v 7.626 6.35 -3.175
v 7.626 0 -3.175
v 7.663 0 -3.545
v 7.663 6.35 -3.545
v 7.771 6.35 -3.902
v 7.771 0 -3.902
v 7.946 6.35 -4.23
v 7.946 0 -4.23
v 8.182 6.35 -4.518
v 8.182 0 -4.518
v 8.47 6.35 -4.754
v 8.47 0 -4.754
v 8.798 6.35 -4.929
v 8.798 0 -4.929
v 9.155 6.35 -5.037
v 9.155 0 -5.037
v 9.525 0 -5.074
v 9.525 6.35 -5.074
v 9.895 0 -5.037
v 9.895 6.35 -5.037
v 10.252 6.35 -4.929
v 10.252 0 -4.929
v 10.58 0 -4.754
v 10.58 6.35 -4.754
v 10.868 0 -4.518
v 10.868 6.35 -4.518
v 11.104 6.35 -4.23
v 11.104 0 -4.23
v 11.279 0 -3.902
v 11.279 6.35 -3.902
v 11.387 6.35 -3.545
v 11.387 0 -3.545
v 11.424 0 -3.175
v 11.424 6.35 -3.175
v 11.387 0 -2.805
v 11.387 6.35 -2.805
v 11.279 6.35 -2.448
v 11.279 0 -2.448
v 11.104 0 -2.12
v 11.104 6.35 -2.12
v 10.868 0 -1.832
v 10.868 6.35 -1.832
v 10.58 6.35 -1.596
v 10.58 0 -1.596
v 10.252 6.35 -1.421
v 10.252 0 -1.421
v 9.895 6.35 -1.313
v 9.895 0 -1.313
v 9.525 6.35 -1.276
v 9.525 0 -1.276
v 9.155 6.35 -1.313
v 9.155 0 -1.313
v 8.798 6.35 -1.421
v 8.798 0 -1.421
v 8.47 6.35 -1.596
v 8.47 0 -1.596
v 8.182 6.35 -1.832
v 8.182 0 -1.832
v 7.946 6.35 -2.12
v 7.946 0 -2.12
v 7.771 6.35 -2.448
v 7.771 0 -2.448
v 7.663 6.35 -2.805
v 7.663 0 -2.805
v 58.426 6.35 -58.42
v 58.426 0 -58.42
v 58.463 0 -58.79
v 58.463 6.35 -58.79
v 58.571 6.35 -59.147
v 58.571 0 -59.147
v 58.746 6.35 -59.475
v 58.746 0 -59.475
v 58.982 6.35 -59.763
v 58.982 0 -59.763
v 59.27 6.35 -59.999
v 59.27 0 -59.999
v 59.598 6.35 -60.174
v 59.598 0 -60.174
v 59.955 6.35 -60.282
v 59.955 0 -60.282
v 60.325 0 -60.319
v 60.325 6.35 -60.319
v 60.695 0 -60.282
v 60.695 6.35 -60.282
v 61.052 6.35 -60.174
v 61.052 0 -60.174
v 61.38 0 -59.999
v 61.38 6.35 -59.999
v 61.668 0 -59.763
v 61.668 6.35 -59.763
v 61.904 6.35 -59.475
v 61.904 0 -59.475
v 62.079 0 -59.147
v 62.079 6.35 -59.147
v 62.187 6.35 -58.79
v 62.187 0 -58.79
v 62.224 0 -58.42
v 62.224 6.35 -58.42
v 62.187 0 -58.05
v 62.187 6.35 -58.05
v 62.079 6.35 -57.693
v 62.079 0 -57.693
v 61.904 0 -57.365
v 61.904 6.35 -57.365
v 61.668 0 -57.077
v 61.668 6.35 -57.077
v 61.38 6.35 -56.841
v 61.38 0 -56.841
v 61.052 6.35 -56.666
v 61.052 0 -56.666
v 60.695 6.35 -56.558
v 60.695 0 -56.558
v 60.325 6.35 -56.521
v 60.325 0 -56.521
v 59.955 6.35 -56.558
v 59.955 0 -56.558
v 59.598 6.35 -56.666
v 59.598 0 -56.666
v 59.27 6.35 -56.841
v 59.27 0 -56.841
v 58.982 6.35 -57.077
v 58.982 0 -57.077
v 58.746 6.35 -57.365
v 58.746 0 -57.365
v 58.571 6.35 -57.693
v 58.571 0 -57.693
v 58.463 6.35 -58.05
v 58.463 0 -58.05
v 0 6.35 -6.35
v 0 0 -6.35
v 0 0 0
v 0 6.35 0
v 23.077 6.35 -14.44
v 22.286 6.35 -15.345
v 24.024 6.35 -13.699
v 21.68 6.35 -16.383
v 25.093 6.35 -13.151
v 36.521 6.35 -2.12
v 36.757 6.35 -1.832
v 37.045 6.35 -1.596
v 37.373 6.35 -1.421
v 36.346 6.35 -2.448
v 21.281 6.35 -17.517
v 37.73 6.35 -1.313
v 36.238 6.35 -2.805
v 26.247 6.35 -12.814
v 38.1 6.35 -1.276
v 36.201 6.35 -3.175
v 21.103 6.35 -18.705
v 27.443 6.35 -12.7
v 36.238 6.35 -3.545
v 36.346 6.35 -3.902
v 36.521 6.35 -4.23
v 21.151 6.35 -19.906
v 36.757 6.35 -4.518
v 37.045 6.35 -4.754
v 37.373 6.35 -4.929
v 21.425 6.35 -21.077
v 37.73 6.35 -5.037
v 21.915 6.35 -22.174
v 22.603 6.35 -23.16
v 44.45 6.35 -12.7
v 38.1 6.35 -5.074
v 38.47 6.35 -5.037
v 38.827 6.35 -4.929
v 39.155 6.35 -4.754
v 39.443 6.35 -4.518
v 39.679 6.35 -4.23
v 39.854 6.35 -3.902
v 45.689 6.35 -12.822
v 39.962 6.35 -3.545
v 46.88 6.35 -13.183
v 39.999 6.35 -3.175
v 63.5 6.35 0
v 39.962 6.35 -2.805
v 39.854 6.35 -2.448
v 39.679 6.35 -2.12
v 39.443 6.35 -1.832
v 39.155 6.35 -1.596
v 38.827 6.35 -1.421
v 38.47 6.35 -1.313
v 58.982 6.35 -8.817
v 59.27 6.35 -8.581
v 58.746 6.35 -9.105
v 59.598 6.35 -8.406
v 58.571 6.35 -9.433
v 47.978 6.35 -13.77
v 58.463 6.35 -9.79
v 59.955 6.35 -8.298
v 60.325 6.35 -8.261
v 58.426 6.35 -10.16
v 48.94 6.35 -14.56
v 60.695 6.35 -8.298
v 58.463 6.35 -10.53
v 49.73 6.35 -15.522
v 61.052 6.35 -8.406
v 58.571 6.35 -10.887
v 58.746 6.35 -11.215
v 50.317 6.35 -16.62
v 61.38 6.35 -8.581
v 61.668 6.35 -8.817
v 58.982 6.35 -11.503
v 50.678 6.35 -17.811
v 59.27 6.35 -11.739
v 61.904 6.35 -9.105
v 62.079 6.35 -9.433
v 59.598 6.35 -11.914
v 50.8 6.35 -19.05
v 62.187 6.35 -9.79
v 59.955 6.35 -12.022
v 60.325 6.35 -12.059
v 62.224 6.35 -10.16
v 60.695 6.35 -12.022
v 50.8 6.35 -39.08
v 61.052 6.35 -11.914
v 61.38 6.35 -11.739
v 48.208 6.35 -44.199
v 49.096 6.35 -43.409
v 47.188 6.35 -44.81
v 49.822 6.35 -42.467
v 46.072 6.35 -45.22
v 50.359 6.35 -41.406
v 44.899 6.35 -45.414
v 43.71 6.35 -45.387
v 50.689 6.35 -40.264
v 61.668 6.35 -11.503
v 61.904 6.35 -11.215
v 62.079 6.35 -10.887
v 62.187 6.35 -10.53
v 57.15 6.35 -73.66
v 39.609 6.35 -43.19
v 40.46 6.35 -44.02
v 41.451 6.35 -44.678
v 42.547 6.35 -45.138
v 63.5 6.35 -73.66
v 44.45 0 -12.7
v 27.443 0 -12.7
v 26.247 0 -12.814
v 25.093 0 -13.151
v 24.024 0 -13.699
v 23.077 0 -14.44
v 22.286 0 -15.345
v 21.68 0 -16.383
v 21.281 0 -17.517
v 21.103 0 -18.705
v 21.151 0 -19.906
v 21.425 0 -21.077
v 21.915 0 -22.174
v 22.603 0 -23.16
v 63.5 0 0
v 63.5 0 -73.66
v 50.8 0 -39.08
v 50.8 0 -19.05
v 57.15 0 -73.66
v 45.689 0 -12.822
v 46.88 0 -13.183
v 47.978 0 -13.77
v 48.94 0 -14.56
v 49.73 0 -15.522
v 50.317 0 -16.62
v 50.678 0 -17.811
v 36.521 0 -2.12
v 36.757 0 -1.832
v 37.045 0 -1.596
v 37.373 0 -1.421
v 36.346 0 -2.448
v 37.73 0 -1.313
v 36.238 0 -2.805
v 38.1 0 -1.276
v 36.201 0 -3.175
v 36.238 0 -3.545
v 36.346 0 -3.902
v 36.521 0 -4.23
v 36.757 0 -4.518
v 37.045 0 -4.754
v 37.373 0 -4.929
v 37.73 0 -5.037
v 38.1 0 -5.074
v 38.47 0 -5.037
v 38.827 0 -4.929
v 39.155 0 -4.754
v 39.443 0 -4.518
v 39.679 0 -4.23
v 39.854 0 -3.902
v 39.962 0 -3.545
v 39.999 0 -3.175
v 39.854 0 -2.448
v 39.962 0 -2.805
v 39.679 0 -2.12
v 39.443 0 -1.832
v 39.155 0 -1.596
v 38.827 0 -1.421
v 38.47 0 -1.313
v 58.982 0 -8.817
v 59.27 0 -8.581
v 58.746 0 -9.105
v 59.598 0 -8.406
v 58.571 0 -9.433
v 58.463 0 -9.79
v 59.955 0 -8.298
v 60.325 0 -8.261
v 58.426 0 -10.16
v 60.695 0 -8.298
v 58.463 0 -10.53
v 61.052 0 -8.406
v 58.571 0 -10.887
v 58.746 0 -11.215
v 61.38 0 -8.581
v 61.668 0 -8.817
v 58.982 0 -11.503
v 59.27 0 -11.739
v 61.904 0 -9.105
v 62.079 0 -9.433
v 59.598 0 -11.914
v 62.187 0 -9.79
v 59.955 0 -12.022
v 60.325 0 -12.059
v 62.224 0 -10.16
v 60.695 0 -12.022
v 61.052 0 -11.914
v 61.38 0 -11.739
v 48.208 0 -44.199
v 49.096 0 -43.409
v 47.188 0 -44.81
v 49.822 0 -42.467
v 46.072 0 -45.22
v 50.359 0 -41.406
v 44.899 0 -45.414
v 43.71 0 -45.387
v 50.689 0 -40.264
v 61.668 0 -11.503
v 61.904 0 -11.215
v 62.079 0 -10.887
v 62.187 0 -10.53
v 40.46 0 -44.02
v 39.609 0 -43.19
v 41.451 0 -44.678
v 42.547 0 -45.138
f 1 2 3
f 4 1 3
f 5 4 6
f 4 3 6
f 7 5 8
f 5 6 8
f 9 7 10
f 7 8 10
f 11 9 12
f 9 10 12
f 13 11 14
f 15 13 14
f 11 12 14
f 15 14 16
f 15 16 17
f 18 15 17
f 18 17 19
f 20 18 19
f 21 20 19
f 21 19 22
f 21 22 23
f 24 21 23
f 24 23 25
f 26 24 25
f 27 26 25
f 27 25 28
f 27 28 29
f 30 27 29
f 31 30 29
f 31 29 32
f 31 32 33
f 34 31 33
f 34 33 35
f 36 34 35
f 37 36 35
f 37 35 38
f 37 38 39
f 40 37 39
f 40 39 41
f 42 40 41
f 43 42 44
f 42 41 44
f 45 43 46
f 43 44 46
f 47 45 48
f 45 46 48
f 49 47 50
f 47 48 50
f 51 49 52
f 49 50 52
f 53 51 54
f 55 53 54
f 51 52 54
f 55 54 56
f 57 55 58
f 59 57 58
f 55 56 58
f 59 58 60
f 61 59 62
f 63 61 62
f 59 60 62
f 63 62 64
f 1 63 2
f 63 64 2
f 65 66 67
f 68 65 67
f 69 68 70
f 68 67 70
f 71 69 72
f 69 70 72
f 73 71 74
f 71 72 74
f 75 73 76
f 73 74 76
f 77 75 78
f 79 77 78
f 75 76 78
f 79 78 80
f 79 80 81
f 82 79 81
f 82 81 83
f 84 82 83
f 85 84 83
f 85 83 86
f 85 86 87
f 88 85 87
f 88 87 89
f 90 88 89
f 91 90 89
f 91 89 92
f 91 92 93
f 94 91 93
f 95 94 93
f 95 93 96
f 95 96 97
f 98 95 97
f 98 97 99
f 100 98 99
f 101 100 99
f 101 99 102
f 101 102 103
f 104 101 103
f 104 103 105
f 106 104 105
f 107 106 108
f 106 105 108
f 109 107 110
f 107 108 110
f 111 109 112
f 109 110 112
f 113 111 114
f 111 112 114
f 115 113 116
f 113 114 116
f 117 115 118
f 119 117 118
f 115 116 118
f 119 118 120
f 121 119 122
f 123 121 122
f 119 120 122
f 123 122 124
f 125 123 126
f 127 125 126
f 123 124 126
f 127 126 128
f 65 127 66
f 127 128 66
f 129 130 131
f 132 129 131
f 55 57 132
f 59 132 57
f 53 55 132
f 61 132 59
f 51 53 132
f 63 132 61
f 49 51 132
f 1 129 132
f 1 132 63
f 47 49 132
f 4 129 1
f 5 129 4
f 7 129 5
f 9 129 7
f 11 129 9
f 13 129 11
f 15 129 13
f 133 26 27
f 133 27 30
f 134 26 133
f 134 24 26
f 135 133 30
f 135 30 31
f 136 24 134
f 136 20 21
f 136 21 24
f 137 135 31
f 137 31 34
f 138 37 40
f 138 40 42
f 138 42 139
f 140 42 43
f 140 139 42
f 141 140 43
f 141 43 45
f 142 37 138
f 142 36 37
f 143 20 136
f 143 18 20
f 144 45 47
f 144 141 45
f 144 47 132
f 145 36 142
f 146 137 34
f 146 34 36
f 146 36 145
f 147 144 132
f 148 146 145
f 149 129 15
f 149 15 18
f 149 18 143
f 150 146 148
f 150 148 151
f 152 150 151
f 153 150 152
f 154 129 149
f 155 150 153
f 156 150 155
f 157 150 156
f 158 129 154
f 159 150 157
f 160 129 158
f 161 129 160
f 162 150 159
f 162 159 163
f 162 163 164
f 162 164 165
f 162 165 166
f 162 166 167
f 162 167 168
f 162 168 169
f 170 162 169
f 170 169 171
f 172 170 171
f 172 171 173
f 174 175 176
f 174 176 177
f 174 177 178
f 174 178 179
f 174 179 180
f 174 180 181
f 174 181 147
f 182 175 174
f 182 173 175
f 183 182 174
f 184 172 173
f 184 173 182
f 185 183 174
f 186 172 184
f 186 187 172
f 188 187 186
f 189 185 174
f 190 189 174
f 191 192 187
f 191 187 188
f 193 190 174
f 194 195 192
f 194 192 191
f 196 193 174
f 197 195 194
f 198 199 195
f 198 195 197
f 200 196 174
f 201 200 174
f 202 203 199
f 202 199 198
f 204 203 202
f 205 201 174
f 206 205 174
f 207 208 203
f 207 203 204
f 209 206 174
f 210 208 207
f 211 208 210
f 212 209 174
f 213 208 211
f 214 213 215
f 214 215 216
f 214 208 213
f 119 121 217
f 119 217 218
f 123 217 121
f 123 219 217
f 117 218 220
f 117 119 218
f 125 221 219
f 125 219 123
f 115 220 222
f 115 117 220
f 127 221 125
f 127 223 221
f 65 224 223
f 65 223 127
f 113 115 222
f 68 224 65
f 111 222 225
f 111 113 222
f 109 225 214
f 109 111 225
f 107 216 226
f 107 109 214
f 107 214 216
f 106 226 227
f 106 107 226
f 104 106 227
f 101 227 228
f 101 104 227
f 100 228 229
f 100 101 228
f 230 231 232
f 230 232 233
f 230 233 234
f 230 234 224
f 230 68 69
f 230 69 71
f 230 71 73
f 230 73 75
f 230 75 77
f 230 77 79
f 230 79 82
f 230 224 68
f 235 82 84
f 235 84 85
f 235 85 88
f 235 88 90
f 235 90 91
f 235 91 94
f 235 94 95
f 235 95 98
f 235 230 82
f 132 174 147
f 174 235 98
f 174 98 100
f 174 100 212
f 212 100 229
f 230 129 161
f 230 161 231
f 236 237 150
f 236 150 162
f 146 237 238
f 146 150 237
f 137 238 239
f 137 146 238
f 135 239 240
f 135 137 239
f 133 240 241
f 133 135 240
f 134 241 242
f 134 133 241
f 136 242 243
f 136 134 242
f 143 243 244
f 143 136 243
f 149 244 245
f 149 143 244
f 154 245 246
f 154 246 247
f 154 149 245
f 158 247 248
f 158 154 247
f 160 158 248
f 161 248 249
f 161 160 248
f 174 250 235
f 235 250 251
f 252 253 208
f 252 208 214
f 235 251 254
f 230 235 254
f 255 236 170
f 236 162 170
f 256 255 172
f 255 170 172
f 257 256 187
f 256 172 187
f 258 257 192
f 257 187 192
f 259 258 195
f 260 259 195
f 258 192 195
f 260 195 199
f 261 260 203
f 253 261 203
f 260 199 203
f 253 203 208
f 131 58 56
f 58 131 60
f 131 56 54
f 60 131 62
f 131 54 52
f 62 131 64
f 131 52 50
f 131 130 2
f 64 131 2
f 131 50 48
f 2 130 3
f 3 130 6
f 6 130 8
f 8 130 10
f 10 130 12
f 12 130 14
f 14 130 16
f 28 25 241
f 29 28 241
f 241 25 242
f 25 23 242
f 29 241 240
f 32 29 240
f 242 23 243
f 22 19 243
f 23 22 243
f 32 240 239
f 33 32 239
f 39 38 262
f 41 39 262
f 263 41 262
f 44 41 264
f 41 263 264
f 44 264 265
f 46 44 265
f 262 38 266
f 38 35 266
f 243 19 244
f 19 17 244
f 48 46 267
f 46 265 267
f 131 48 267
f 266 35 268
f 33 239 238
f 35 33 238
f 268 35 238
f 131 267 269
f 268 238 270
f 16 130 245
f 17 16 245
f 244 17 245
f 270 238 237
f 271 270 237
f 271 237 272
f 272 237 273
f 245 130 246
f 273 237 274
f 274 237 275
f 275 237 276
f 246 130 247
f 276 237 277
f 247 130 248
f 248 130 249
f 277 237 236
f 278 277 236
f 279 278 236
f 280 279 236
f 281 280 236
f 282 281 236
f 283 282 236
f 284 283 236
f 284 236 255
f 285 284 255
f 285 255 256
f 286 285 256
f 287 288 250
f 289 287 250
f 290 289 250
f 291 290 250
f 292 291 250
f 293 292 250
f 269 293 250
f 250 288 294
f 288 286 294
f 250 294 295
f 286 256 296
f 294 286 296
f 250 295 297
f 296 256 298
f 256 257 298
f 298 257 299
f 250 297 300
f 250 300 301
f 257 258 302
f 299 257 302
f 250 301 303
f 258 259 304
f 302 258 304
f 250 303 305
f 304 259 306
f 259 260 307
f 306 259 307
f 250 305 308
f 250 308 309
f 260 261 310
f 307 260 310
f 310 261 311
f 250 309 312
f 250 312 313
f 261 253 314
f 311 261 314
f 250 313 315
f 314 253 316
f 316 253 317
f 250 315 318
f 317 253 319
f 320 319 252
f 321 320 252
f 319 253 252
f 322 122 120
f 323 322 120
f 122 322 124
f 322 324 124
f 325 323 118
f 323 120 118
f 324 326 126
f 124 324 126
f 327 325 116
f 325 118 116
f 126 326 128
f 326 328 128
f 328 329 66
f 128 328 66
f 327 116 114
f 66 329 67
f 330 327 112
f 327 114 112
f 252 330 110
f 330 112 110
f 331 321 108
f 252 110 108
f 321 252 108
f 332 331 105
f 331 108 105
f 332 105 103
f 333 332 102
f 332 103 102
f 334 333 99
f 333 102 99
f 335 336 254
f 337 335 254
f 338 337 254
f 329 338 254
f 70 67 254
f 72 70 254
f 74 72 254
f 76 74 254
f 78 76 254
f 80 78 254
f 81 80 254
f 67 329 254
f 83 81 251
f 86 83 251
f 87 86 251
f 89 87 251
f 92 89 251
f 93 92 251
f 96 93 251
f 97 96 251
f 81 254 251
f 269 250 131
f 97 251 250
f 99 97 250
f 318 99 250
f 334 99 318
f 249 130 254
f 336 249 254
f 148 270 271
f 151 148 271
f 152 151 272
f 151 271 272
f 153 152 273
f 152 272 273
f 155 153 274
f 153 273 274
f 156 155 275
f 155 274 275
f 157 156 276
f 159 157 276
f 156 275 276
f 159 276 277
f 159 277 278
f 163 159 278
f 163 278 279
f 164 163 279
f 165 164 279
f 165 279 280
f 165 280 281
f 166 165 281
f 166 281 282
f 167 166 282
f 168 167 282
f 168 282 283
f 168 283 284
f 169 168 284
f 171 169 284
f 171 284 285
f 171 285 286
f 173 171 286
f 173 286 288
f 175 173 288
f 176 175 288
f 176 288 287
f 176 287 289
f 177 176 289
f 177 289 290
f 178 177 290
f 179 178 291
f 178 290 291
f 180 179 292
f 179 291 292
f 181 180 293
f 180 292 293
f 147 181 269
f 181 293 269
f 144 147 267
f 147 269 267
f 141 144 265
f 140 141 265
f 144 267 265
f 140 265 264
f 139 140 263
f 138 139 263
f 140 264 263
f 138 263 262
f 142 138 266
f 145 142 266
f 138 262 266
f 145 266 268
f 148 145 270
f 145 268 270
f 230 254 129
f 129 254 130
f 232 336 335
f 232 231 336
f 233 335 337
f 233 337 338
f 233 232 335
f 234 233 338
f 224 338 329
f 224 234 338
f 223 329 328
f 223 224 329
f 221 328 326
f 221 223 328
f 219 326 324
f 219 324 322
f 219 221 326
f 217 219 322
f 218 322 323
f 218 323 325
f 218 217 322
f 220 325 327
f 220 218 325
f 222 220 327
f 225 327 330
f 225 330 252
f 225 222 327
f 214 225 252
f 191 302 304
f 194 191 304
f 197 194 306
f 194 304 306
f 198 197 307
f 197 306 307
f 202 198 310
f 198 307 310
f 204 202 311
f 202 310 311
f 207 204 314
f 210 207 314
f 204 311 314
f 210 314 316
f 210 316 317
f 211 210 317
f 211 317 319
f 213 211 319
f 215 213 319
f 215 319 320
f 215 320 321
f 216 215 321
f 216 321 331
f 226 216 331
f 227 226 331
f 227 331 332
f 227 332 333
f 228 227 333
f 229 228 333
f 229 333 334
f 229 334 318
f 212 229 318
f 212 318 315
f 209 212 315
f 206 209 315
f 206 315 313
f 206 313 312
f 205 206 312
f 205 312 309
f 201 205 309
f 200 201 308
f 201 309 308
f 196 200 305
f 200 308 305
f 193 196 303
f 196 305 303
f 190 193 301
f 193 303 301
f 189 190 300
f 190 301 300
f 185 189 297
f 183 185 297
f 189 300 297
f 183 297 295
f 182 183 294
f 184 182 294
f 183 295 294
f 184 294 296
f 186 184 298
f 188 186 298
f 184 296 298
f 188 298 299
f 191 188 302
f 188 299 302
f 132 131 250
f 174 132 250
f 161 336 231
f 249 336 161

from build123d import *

# Parameters (mm, degrees)
BOSS_EXTRUDE1_DEPTH       = 6.35
F_6_CLEARANCE_HOLE1_D     = 3.7973
F_6_CLEARANCE_HOLE1_DEPTH = 12.7
F_6_CLEARANCE_HOLE1_TIP   = 1.140824014
FILLET1_R                 = 6.35


with BuildPart() as part:
    # Sketch1 → Boss-Extrude1 (new body)
    with BuildSketch(Plane(origin=(0, 0, 0), x_dir=(1, 0, 0), z_dir=(0, 1, 0))):
        Polygon((0, 0), (63.5, 0), (63.5, 73.66), (57.15, 73.66), (0, 6.35), align=None)
        Polygon((13.721627919, 12.7), (50.8, 12.7), (50.8, 56.370082673), align=None, mode=Mode.SUBTRACT)
    extrude(amount=BOSS_EXTRUDE1_DEPTH)

    # #6 Clearance Hole1
    with Locations(Plane(origin=(0, 6.35, 0), x_dir=(1, 0, 0), z_dir=(0, 1, 0))):
        with Locations((9.525, 3.175), (38.1, 3.175), (60.325, 10.16), (60.325, 58.42)):
            Hole(F_6_CLEARANCE_HOLE1_D / 2, depth=F_6_CLEARANCE_HOLE1_DEPTH)
            with Locations((0, 0, -(F_6_CLEARANCE_HOLE1_DEPTH + F_6_CLEARANCE_HOLE1_TIP / 2))):  # 118° drill point
                Cone(0, F_6_CLEARANCE_HOLE1_D / 2, F_6_CLEARANCE_HOLE1_TIP, mode=Mode.SUBTRACT)

    # Fillet1
    fillet1_edges = [part.edges().sort_by_distance(p)[0] for p in [
        (50.8, 3.175, -12.7),
        (50.8, 3.175, -56.370082673),
        (13.721627919, 3.175, -12.7),
    ]]
    fillet(fillet1_edges, radius=FILLET1_R)


solid = part.part
